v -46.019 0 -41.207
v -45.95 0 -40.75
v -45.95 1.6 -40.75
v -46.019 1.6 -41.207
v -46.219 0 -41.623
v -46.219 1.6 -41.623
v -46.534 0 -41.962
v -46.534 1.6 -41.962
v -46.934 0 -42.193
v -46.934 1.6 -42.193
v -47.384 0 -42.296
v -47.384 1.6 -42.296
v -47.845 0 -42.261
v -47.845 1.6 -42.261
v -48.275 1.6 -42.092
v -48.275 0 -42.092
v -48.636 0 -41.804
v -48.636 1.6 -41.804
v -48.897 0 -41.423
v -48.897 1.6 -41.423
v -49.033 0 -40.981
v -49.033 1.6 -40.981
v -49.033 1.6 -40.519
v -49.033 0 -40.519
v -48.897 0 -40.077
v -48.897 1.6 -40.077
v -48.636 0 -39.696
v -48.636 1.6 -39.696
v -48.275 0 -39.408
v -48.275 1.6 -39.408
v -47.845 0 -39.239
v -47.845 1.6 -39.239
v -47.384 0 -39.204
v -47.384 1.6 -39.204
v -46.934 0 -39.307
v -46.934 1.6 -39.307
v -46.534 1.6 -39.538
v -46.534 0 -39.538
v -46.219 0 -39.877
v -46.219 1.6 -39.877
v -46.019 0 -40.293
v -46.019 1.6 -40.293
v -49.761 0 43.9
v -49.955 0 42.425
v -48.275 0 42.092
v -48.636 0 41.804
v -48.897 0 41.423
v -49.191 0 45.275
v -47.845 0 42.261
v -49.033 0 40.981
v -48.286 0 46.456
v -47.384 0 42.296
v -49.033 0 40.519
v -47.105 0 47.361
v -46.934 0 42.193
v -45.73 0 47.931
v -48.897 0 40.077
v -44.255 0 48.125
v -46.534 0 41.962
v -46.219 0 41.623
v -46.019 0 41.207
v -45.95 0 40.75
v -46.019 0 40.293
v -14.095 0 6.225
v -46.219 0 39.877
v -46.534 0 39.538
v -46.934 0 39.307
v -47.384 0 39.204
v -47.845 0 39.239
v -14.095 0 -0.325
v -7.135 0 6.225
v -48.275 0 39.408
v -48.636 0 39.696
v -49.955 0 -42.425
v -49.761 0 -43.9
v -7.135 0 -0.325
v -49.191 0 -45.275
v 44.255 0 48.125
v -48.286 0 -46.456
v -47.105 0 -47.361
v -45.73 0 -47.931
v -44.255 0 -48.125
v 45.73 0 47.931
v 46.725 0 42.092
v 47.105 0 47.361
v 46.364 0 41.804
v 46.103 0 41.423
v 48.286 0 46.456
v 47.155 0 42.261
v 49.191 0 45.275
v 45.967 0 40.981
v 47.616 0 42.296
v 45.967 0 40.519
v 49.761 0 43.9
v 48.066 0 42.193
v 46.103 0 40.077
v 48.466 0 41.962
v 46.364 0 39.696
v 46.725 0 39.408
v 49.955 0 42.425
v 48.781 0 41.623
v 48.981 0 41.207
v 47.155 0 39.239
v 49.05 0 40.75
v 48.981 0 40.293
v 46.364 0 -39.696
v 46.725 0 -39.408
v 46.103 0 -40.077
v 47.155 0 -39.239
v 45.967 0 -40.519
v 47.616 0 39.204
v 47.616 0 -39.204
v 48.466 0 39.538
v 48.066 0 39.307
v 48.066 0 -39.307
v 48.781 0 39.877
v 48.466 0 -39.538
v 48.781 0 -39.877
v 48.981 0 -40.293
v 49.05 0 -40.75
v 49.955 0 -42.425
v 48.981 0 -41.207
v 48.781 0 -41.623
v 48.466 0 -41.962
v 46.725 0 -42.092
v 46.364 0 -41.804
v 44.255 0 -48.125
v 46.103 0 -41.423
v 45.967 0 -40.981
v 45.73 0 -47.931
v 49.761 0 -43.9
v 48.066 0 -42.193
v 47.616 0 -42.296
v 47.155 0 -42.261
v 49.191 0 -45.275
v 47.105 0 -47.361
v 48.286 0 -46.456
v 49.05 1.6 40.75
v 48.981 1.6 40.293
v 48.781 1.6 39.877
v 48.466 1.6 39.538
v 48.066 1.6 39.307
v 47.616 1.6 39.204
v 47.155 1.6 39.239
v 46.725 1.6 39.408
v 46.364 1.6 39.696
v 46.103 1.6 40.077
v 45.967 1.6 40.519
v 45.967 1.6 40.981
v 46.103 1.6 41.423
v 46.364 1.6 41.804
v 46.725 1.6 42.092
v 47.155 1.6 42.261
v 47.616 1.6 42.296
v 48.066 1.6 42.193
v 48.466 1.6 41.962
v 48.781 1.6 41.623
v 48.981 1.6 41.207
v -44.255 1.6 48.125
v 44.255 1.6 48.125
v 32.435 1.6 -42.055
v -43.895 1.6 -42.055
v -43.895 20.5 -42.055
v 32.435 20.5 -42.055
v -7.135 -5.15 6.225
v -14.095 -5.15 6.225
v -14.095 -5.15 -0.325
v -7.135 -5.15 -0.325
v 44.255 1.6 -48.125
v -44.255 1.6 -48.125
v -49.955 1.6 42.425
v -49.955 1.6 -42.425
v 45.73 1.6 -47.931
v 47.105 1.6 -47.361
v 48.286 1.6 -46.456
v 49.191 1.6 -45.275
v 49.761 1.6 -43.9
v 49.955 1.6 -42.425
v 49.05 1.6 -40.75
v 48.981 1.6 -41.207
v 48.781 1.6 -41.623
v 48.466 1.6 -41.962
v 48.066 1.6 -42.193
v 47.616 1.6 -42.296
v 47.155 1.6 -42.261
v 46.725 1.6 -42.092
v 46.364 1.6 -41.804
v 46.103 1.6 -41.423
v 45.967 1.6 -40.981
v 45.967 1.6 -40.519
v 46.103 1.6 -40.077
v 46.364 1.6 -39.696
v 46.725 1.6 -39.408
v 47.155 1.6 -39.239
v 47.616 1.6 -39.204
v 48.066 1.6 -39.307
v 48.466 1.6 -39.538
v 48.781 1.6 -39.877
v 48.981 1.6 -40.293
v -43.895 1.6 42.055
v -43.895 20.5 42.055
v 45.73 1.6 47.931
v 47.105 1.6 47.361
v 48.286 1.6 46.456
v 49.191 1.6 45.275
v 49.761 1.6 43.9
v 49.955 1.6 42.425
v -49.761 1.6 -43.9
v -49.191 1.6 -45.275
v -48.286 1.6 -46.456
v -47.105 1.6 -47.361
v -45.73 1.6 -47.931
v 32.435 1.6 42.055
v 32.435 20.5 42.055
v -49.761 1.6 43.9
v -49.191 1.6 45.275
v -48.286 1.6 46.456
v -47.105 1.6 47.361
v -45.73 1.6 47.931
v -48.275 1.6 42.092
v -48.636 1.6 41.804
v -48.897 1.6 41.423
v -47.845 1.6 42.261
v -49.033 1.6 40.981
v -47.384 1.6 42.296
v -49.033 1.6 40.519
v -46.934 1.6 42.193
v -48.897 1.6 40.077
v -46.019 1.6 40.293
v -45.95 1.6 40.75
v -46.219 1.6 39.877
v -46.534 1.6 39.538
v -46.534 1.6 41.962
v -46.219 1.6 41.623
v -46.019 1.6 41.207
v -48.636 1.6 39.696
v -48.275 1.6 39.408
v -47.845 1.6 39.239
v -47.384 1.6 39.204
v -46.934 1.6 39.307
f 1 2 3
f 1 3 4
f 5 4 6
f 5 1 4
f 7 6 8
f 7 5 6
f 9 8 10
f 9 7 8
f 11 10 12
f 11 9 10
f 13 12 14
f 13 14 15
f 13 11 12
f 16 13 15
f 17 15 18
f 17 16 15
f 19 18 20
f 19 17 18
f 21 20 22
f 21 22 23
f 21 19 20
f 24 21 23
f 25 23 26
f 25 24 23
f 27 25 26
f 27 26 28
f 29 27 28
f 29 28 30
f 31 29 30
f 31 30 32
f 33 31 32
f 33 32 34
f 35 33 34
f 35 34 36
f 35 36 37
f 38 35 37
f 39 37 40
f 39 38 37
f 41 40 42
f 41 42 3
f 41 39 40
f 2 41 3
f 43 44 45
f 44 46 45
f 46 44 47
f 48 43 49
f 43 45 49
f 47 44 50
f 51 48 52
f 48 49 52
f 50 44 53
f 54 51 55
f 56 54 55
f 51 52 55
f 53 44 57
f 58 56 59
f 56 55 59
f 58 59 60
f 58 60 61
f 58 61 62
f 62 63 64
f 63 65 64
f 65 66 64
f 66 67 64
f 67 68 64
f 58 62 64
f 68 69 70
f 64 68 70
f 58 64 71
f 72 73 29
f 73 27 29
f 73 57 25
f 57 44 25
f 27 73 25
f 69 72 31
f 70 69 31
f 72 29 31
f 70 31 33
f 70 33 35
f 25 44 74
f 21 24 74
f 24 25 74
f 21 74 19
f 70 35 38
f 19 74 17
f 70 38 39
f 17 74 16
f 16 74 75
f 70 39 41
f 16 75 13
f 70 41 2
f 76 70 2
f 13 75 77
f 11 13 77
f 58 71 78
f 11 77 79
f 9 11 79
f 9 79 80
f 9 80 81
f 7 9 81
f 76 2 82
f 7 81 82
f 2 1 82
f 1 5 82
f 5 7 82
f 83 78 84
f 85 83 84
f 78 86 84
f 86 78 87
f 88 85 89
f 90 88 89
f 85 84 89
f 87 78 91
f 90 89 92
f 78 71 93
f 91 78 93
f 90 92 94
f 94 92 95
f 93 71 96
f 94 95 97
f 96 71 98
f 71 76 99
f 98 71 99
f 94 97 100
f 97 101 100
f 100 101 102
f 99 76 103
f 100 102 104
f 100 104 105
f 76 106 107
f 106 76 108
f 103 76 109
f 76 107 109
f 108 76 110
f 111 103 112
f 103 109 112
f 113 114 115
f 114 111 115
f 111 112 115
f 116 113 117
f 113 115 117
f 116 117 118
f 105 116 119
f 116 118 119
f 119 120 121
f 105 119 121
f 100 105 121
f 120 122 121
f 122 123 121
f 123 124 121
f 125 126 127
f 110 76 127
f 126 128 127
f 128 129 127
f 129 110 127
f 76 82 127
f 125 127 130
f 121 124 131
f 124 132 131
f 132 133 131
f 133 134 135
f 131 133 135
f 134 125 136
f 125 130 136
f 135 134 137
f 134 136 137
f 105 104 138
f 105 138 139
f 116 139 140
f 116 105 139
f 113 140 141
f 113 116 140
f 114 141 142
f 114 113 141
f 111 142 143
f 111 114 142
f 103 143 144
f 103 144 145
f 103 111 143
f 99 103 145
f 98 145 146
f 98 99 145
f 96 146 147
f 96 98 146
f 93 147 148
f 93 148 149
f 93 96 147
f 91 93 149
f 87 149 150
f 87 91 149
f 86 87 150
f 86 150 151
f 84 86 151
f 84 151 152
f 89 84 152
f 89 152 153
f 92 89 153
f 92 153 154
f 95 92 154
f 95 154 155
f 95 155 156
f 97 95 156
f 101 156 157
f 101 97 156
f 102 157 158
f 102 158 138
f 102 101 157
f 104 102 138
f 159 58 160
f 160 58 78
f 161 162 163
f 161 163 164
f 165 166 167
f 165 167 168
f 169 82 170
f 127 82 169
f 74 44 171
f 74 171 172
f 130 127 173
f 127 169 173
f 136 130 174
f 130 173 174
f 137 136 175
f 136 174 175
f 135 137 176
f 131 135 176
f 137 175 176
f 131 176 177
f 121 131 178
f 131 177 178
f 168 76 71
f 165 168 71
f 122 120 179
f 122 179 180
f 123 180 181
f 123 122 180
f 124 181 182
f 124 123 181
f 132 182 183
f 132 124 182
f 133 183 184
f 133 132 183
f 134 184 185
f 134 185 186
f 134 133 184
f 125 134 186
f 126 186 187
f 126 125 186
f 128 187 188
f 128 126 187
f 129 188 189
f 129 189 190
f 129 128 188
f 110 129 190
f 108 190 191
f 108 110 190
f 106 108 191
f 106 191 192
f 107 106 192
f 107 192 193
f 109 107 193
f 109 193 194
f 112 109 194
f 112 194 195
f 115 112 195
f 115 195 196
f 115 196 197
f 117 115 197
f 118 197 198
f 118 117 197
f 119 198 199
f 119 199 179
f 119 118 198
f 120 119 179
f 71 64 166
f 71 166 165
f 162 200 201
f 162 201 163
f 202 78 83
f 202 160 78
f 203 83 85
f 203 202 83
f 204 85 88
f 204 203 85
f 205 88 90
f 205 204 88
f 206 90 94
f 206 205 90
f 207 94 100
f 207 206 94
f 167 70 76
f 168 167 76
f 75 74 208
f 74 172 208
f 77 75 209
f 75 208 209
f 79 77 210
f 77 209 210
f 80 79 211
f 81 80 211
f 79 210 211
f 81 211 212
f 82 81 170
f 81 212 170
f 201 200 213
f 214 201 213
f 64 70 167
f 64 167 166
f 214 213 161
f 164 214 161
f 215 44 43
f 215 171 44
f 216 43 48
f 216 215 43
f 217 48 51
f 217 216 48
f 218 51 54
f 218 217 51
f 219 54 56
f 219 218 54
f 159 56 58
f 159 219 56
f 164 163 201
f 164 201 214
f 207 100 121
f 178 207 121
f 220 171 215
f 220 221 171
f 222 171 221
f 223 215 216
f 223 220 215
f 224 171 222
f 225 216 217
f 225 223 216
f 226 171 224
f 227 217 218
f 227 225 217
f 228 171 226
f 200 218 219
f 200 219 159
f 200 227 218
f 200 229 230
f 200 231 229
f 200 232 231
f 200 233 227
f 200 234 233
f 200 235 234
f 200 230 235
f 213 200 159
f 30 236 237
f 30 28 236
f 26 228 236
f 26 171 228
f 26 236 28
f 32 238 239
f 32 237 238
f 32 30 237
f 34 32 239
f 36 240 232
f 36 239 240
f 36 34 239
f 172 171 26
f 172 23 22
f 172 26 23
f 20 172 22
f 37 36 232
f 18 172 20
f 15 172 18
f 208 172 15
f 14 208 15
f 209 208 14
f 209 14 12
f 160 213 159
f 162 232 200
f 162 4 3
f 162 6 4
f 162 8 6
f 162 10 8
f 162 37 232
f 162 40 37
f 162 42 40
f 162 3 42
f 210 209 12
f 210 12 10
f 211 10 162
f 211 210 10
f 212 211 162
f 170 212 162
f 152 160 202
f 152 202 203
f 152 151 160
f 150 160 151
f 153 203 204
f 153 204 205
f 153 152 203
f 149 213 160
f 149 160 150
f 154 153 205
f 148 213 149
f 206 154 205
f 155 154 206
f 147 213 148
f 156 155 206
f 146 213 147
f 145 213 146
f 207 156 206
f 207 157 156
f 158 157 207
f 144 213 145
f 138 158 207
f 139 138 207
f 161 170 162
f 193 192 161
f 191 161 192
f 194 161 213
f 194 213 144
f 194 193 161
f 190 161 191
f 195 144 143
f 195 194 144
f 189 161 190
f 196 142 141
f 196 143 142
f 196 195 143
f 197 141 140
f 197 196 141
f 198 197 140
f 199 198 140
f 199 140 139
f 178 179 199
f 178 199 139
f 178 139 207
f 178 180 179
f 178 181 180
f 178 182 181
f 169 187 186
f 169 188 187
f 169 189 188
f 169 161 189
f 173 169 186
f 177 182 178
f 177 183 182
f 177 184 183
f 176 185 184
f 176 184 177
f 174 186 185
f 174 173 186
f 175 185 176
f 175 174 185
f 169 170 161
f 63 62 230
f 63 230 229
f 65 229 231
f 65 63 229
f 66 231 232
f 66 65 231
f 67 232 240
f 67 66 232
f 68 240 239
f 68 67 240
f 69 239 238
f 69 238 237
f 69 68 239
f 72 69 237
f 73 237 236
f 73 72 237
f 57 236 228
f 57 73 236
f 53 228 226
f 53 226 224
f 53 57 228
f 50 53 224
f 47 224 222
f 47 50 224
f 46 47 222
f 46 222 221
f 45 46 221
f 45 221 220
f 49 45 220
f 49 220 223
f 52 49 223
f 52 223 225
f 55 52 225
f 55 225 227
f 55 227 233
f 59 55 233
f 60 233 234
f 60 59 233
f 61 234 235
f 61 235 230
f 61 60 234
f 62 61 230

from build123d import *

# Parameters (mm, degrees)
SKETCH1_W           = 99.910000078
SKETCH1_H           = 96.25
SKETCH1_R           = 1.55
BOSS_EXTRUDE1_DEPTH = 1.6
FILLET1_R           = 5.7
SKETCH2_W           = 76.33
SKETCH2_H           = 84.11
BOSS_EXTRUDE2_DEPTH = 18.9
SKETCH3_W           = 6.96
SKETCH3_H           = 6.55
BOSS_EXTRUDE3_DEPTH = 5.15


with BuildPart() as part:
    # Sketch1 → Boss-Extrude1 (new body)
    with BuildSketch(Plane(origin=(0, 0, 0), x_dir=(1, 0, 0), z_dir=(0, 1, 0))):
        Rectangle(SKETCH1_W, SKETCH1_H)
        with Locations((-47.5, 40.75)):
            Circle(SKETCH1_R, mode=Mode.SUBTRACT)
        with Locations((47.5, 40.75)):
            Circle(SKETCH1_R, mode=Mode.SUBTRACT)
        with Locations((-47.5, -40.75)):
            Circle(SKETCH1_R, mode=Mode.SUBTRACT)
        with Locations((47.5, -40.75)):
            Circle(SKETCH1_R, mode=Mode.SUBTRACT)
    extrude(amount=BOSS_EXTRUDE1_DEPTH)

    # Fillet1
    fillet1_edges = [part.edges().sort_by_distance(p)[0] for p in [
        (-49.955000039, 0.8, -48.125),
        (49.955000039, 0.8, -48.125),
        (49.955000039, 0.8, 48.125),
        (-49.955000039, 0.8, 48.125),
    ]]
    fillet(fillet1_edges, radius=FILLET1_R)

    # Sketch2 → Boss-Extrude2 (add)
    with BuildSketch(Plane(origin=(0, 1.6, 0), x_dir=(1, 0, 0), z_dir=(0, 1, 0))):
        with Locations((-5.730000039, 0)):
            Rectangle(SKETCH2_W, SKETCH2_H)
    extrude(amount=BOSS_EXTRUDE2_DEPTH)

    # Sketch3 → Boss-Extrude3 (add)
    with BuildSketch(Plane.XZ):
        with Locations((-10.615000039, 2.95)):
            Rectangle(SKETCH3_W, SKETCH3_H)
    extrude(amount=BOSS_EXTRUDE3_DEPTH)


solid = part.part
